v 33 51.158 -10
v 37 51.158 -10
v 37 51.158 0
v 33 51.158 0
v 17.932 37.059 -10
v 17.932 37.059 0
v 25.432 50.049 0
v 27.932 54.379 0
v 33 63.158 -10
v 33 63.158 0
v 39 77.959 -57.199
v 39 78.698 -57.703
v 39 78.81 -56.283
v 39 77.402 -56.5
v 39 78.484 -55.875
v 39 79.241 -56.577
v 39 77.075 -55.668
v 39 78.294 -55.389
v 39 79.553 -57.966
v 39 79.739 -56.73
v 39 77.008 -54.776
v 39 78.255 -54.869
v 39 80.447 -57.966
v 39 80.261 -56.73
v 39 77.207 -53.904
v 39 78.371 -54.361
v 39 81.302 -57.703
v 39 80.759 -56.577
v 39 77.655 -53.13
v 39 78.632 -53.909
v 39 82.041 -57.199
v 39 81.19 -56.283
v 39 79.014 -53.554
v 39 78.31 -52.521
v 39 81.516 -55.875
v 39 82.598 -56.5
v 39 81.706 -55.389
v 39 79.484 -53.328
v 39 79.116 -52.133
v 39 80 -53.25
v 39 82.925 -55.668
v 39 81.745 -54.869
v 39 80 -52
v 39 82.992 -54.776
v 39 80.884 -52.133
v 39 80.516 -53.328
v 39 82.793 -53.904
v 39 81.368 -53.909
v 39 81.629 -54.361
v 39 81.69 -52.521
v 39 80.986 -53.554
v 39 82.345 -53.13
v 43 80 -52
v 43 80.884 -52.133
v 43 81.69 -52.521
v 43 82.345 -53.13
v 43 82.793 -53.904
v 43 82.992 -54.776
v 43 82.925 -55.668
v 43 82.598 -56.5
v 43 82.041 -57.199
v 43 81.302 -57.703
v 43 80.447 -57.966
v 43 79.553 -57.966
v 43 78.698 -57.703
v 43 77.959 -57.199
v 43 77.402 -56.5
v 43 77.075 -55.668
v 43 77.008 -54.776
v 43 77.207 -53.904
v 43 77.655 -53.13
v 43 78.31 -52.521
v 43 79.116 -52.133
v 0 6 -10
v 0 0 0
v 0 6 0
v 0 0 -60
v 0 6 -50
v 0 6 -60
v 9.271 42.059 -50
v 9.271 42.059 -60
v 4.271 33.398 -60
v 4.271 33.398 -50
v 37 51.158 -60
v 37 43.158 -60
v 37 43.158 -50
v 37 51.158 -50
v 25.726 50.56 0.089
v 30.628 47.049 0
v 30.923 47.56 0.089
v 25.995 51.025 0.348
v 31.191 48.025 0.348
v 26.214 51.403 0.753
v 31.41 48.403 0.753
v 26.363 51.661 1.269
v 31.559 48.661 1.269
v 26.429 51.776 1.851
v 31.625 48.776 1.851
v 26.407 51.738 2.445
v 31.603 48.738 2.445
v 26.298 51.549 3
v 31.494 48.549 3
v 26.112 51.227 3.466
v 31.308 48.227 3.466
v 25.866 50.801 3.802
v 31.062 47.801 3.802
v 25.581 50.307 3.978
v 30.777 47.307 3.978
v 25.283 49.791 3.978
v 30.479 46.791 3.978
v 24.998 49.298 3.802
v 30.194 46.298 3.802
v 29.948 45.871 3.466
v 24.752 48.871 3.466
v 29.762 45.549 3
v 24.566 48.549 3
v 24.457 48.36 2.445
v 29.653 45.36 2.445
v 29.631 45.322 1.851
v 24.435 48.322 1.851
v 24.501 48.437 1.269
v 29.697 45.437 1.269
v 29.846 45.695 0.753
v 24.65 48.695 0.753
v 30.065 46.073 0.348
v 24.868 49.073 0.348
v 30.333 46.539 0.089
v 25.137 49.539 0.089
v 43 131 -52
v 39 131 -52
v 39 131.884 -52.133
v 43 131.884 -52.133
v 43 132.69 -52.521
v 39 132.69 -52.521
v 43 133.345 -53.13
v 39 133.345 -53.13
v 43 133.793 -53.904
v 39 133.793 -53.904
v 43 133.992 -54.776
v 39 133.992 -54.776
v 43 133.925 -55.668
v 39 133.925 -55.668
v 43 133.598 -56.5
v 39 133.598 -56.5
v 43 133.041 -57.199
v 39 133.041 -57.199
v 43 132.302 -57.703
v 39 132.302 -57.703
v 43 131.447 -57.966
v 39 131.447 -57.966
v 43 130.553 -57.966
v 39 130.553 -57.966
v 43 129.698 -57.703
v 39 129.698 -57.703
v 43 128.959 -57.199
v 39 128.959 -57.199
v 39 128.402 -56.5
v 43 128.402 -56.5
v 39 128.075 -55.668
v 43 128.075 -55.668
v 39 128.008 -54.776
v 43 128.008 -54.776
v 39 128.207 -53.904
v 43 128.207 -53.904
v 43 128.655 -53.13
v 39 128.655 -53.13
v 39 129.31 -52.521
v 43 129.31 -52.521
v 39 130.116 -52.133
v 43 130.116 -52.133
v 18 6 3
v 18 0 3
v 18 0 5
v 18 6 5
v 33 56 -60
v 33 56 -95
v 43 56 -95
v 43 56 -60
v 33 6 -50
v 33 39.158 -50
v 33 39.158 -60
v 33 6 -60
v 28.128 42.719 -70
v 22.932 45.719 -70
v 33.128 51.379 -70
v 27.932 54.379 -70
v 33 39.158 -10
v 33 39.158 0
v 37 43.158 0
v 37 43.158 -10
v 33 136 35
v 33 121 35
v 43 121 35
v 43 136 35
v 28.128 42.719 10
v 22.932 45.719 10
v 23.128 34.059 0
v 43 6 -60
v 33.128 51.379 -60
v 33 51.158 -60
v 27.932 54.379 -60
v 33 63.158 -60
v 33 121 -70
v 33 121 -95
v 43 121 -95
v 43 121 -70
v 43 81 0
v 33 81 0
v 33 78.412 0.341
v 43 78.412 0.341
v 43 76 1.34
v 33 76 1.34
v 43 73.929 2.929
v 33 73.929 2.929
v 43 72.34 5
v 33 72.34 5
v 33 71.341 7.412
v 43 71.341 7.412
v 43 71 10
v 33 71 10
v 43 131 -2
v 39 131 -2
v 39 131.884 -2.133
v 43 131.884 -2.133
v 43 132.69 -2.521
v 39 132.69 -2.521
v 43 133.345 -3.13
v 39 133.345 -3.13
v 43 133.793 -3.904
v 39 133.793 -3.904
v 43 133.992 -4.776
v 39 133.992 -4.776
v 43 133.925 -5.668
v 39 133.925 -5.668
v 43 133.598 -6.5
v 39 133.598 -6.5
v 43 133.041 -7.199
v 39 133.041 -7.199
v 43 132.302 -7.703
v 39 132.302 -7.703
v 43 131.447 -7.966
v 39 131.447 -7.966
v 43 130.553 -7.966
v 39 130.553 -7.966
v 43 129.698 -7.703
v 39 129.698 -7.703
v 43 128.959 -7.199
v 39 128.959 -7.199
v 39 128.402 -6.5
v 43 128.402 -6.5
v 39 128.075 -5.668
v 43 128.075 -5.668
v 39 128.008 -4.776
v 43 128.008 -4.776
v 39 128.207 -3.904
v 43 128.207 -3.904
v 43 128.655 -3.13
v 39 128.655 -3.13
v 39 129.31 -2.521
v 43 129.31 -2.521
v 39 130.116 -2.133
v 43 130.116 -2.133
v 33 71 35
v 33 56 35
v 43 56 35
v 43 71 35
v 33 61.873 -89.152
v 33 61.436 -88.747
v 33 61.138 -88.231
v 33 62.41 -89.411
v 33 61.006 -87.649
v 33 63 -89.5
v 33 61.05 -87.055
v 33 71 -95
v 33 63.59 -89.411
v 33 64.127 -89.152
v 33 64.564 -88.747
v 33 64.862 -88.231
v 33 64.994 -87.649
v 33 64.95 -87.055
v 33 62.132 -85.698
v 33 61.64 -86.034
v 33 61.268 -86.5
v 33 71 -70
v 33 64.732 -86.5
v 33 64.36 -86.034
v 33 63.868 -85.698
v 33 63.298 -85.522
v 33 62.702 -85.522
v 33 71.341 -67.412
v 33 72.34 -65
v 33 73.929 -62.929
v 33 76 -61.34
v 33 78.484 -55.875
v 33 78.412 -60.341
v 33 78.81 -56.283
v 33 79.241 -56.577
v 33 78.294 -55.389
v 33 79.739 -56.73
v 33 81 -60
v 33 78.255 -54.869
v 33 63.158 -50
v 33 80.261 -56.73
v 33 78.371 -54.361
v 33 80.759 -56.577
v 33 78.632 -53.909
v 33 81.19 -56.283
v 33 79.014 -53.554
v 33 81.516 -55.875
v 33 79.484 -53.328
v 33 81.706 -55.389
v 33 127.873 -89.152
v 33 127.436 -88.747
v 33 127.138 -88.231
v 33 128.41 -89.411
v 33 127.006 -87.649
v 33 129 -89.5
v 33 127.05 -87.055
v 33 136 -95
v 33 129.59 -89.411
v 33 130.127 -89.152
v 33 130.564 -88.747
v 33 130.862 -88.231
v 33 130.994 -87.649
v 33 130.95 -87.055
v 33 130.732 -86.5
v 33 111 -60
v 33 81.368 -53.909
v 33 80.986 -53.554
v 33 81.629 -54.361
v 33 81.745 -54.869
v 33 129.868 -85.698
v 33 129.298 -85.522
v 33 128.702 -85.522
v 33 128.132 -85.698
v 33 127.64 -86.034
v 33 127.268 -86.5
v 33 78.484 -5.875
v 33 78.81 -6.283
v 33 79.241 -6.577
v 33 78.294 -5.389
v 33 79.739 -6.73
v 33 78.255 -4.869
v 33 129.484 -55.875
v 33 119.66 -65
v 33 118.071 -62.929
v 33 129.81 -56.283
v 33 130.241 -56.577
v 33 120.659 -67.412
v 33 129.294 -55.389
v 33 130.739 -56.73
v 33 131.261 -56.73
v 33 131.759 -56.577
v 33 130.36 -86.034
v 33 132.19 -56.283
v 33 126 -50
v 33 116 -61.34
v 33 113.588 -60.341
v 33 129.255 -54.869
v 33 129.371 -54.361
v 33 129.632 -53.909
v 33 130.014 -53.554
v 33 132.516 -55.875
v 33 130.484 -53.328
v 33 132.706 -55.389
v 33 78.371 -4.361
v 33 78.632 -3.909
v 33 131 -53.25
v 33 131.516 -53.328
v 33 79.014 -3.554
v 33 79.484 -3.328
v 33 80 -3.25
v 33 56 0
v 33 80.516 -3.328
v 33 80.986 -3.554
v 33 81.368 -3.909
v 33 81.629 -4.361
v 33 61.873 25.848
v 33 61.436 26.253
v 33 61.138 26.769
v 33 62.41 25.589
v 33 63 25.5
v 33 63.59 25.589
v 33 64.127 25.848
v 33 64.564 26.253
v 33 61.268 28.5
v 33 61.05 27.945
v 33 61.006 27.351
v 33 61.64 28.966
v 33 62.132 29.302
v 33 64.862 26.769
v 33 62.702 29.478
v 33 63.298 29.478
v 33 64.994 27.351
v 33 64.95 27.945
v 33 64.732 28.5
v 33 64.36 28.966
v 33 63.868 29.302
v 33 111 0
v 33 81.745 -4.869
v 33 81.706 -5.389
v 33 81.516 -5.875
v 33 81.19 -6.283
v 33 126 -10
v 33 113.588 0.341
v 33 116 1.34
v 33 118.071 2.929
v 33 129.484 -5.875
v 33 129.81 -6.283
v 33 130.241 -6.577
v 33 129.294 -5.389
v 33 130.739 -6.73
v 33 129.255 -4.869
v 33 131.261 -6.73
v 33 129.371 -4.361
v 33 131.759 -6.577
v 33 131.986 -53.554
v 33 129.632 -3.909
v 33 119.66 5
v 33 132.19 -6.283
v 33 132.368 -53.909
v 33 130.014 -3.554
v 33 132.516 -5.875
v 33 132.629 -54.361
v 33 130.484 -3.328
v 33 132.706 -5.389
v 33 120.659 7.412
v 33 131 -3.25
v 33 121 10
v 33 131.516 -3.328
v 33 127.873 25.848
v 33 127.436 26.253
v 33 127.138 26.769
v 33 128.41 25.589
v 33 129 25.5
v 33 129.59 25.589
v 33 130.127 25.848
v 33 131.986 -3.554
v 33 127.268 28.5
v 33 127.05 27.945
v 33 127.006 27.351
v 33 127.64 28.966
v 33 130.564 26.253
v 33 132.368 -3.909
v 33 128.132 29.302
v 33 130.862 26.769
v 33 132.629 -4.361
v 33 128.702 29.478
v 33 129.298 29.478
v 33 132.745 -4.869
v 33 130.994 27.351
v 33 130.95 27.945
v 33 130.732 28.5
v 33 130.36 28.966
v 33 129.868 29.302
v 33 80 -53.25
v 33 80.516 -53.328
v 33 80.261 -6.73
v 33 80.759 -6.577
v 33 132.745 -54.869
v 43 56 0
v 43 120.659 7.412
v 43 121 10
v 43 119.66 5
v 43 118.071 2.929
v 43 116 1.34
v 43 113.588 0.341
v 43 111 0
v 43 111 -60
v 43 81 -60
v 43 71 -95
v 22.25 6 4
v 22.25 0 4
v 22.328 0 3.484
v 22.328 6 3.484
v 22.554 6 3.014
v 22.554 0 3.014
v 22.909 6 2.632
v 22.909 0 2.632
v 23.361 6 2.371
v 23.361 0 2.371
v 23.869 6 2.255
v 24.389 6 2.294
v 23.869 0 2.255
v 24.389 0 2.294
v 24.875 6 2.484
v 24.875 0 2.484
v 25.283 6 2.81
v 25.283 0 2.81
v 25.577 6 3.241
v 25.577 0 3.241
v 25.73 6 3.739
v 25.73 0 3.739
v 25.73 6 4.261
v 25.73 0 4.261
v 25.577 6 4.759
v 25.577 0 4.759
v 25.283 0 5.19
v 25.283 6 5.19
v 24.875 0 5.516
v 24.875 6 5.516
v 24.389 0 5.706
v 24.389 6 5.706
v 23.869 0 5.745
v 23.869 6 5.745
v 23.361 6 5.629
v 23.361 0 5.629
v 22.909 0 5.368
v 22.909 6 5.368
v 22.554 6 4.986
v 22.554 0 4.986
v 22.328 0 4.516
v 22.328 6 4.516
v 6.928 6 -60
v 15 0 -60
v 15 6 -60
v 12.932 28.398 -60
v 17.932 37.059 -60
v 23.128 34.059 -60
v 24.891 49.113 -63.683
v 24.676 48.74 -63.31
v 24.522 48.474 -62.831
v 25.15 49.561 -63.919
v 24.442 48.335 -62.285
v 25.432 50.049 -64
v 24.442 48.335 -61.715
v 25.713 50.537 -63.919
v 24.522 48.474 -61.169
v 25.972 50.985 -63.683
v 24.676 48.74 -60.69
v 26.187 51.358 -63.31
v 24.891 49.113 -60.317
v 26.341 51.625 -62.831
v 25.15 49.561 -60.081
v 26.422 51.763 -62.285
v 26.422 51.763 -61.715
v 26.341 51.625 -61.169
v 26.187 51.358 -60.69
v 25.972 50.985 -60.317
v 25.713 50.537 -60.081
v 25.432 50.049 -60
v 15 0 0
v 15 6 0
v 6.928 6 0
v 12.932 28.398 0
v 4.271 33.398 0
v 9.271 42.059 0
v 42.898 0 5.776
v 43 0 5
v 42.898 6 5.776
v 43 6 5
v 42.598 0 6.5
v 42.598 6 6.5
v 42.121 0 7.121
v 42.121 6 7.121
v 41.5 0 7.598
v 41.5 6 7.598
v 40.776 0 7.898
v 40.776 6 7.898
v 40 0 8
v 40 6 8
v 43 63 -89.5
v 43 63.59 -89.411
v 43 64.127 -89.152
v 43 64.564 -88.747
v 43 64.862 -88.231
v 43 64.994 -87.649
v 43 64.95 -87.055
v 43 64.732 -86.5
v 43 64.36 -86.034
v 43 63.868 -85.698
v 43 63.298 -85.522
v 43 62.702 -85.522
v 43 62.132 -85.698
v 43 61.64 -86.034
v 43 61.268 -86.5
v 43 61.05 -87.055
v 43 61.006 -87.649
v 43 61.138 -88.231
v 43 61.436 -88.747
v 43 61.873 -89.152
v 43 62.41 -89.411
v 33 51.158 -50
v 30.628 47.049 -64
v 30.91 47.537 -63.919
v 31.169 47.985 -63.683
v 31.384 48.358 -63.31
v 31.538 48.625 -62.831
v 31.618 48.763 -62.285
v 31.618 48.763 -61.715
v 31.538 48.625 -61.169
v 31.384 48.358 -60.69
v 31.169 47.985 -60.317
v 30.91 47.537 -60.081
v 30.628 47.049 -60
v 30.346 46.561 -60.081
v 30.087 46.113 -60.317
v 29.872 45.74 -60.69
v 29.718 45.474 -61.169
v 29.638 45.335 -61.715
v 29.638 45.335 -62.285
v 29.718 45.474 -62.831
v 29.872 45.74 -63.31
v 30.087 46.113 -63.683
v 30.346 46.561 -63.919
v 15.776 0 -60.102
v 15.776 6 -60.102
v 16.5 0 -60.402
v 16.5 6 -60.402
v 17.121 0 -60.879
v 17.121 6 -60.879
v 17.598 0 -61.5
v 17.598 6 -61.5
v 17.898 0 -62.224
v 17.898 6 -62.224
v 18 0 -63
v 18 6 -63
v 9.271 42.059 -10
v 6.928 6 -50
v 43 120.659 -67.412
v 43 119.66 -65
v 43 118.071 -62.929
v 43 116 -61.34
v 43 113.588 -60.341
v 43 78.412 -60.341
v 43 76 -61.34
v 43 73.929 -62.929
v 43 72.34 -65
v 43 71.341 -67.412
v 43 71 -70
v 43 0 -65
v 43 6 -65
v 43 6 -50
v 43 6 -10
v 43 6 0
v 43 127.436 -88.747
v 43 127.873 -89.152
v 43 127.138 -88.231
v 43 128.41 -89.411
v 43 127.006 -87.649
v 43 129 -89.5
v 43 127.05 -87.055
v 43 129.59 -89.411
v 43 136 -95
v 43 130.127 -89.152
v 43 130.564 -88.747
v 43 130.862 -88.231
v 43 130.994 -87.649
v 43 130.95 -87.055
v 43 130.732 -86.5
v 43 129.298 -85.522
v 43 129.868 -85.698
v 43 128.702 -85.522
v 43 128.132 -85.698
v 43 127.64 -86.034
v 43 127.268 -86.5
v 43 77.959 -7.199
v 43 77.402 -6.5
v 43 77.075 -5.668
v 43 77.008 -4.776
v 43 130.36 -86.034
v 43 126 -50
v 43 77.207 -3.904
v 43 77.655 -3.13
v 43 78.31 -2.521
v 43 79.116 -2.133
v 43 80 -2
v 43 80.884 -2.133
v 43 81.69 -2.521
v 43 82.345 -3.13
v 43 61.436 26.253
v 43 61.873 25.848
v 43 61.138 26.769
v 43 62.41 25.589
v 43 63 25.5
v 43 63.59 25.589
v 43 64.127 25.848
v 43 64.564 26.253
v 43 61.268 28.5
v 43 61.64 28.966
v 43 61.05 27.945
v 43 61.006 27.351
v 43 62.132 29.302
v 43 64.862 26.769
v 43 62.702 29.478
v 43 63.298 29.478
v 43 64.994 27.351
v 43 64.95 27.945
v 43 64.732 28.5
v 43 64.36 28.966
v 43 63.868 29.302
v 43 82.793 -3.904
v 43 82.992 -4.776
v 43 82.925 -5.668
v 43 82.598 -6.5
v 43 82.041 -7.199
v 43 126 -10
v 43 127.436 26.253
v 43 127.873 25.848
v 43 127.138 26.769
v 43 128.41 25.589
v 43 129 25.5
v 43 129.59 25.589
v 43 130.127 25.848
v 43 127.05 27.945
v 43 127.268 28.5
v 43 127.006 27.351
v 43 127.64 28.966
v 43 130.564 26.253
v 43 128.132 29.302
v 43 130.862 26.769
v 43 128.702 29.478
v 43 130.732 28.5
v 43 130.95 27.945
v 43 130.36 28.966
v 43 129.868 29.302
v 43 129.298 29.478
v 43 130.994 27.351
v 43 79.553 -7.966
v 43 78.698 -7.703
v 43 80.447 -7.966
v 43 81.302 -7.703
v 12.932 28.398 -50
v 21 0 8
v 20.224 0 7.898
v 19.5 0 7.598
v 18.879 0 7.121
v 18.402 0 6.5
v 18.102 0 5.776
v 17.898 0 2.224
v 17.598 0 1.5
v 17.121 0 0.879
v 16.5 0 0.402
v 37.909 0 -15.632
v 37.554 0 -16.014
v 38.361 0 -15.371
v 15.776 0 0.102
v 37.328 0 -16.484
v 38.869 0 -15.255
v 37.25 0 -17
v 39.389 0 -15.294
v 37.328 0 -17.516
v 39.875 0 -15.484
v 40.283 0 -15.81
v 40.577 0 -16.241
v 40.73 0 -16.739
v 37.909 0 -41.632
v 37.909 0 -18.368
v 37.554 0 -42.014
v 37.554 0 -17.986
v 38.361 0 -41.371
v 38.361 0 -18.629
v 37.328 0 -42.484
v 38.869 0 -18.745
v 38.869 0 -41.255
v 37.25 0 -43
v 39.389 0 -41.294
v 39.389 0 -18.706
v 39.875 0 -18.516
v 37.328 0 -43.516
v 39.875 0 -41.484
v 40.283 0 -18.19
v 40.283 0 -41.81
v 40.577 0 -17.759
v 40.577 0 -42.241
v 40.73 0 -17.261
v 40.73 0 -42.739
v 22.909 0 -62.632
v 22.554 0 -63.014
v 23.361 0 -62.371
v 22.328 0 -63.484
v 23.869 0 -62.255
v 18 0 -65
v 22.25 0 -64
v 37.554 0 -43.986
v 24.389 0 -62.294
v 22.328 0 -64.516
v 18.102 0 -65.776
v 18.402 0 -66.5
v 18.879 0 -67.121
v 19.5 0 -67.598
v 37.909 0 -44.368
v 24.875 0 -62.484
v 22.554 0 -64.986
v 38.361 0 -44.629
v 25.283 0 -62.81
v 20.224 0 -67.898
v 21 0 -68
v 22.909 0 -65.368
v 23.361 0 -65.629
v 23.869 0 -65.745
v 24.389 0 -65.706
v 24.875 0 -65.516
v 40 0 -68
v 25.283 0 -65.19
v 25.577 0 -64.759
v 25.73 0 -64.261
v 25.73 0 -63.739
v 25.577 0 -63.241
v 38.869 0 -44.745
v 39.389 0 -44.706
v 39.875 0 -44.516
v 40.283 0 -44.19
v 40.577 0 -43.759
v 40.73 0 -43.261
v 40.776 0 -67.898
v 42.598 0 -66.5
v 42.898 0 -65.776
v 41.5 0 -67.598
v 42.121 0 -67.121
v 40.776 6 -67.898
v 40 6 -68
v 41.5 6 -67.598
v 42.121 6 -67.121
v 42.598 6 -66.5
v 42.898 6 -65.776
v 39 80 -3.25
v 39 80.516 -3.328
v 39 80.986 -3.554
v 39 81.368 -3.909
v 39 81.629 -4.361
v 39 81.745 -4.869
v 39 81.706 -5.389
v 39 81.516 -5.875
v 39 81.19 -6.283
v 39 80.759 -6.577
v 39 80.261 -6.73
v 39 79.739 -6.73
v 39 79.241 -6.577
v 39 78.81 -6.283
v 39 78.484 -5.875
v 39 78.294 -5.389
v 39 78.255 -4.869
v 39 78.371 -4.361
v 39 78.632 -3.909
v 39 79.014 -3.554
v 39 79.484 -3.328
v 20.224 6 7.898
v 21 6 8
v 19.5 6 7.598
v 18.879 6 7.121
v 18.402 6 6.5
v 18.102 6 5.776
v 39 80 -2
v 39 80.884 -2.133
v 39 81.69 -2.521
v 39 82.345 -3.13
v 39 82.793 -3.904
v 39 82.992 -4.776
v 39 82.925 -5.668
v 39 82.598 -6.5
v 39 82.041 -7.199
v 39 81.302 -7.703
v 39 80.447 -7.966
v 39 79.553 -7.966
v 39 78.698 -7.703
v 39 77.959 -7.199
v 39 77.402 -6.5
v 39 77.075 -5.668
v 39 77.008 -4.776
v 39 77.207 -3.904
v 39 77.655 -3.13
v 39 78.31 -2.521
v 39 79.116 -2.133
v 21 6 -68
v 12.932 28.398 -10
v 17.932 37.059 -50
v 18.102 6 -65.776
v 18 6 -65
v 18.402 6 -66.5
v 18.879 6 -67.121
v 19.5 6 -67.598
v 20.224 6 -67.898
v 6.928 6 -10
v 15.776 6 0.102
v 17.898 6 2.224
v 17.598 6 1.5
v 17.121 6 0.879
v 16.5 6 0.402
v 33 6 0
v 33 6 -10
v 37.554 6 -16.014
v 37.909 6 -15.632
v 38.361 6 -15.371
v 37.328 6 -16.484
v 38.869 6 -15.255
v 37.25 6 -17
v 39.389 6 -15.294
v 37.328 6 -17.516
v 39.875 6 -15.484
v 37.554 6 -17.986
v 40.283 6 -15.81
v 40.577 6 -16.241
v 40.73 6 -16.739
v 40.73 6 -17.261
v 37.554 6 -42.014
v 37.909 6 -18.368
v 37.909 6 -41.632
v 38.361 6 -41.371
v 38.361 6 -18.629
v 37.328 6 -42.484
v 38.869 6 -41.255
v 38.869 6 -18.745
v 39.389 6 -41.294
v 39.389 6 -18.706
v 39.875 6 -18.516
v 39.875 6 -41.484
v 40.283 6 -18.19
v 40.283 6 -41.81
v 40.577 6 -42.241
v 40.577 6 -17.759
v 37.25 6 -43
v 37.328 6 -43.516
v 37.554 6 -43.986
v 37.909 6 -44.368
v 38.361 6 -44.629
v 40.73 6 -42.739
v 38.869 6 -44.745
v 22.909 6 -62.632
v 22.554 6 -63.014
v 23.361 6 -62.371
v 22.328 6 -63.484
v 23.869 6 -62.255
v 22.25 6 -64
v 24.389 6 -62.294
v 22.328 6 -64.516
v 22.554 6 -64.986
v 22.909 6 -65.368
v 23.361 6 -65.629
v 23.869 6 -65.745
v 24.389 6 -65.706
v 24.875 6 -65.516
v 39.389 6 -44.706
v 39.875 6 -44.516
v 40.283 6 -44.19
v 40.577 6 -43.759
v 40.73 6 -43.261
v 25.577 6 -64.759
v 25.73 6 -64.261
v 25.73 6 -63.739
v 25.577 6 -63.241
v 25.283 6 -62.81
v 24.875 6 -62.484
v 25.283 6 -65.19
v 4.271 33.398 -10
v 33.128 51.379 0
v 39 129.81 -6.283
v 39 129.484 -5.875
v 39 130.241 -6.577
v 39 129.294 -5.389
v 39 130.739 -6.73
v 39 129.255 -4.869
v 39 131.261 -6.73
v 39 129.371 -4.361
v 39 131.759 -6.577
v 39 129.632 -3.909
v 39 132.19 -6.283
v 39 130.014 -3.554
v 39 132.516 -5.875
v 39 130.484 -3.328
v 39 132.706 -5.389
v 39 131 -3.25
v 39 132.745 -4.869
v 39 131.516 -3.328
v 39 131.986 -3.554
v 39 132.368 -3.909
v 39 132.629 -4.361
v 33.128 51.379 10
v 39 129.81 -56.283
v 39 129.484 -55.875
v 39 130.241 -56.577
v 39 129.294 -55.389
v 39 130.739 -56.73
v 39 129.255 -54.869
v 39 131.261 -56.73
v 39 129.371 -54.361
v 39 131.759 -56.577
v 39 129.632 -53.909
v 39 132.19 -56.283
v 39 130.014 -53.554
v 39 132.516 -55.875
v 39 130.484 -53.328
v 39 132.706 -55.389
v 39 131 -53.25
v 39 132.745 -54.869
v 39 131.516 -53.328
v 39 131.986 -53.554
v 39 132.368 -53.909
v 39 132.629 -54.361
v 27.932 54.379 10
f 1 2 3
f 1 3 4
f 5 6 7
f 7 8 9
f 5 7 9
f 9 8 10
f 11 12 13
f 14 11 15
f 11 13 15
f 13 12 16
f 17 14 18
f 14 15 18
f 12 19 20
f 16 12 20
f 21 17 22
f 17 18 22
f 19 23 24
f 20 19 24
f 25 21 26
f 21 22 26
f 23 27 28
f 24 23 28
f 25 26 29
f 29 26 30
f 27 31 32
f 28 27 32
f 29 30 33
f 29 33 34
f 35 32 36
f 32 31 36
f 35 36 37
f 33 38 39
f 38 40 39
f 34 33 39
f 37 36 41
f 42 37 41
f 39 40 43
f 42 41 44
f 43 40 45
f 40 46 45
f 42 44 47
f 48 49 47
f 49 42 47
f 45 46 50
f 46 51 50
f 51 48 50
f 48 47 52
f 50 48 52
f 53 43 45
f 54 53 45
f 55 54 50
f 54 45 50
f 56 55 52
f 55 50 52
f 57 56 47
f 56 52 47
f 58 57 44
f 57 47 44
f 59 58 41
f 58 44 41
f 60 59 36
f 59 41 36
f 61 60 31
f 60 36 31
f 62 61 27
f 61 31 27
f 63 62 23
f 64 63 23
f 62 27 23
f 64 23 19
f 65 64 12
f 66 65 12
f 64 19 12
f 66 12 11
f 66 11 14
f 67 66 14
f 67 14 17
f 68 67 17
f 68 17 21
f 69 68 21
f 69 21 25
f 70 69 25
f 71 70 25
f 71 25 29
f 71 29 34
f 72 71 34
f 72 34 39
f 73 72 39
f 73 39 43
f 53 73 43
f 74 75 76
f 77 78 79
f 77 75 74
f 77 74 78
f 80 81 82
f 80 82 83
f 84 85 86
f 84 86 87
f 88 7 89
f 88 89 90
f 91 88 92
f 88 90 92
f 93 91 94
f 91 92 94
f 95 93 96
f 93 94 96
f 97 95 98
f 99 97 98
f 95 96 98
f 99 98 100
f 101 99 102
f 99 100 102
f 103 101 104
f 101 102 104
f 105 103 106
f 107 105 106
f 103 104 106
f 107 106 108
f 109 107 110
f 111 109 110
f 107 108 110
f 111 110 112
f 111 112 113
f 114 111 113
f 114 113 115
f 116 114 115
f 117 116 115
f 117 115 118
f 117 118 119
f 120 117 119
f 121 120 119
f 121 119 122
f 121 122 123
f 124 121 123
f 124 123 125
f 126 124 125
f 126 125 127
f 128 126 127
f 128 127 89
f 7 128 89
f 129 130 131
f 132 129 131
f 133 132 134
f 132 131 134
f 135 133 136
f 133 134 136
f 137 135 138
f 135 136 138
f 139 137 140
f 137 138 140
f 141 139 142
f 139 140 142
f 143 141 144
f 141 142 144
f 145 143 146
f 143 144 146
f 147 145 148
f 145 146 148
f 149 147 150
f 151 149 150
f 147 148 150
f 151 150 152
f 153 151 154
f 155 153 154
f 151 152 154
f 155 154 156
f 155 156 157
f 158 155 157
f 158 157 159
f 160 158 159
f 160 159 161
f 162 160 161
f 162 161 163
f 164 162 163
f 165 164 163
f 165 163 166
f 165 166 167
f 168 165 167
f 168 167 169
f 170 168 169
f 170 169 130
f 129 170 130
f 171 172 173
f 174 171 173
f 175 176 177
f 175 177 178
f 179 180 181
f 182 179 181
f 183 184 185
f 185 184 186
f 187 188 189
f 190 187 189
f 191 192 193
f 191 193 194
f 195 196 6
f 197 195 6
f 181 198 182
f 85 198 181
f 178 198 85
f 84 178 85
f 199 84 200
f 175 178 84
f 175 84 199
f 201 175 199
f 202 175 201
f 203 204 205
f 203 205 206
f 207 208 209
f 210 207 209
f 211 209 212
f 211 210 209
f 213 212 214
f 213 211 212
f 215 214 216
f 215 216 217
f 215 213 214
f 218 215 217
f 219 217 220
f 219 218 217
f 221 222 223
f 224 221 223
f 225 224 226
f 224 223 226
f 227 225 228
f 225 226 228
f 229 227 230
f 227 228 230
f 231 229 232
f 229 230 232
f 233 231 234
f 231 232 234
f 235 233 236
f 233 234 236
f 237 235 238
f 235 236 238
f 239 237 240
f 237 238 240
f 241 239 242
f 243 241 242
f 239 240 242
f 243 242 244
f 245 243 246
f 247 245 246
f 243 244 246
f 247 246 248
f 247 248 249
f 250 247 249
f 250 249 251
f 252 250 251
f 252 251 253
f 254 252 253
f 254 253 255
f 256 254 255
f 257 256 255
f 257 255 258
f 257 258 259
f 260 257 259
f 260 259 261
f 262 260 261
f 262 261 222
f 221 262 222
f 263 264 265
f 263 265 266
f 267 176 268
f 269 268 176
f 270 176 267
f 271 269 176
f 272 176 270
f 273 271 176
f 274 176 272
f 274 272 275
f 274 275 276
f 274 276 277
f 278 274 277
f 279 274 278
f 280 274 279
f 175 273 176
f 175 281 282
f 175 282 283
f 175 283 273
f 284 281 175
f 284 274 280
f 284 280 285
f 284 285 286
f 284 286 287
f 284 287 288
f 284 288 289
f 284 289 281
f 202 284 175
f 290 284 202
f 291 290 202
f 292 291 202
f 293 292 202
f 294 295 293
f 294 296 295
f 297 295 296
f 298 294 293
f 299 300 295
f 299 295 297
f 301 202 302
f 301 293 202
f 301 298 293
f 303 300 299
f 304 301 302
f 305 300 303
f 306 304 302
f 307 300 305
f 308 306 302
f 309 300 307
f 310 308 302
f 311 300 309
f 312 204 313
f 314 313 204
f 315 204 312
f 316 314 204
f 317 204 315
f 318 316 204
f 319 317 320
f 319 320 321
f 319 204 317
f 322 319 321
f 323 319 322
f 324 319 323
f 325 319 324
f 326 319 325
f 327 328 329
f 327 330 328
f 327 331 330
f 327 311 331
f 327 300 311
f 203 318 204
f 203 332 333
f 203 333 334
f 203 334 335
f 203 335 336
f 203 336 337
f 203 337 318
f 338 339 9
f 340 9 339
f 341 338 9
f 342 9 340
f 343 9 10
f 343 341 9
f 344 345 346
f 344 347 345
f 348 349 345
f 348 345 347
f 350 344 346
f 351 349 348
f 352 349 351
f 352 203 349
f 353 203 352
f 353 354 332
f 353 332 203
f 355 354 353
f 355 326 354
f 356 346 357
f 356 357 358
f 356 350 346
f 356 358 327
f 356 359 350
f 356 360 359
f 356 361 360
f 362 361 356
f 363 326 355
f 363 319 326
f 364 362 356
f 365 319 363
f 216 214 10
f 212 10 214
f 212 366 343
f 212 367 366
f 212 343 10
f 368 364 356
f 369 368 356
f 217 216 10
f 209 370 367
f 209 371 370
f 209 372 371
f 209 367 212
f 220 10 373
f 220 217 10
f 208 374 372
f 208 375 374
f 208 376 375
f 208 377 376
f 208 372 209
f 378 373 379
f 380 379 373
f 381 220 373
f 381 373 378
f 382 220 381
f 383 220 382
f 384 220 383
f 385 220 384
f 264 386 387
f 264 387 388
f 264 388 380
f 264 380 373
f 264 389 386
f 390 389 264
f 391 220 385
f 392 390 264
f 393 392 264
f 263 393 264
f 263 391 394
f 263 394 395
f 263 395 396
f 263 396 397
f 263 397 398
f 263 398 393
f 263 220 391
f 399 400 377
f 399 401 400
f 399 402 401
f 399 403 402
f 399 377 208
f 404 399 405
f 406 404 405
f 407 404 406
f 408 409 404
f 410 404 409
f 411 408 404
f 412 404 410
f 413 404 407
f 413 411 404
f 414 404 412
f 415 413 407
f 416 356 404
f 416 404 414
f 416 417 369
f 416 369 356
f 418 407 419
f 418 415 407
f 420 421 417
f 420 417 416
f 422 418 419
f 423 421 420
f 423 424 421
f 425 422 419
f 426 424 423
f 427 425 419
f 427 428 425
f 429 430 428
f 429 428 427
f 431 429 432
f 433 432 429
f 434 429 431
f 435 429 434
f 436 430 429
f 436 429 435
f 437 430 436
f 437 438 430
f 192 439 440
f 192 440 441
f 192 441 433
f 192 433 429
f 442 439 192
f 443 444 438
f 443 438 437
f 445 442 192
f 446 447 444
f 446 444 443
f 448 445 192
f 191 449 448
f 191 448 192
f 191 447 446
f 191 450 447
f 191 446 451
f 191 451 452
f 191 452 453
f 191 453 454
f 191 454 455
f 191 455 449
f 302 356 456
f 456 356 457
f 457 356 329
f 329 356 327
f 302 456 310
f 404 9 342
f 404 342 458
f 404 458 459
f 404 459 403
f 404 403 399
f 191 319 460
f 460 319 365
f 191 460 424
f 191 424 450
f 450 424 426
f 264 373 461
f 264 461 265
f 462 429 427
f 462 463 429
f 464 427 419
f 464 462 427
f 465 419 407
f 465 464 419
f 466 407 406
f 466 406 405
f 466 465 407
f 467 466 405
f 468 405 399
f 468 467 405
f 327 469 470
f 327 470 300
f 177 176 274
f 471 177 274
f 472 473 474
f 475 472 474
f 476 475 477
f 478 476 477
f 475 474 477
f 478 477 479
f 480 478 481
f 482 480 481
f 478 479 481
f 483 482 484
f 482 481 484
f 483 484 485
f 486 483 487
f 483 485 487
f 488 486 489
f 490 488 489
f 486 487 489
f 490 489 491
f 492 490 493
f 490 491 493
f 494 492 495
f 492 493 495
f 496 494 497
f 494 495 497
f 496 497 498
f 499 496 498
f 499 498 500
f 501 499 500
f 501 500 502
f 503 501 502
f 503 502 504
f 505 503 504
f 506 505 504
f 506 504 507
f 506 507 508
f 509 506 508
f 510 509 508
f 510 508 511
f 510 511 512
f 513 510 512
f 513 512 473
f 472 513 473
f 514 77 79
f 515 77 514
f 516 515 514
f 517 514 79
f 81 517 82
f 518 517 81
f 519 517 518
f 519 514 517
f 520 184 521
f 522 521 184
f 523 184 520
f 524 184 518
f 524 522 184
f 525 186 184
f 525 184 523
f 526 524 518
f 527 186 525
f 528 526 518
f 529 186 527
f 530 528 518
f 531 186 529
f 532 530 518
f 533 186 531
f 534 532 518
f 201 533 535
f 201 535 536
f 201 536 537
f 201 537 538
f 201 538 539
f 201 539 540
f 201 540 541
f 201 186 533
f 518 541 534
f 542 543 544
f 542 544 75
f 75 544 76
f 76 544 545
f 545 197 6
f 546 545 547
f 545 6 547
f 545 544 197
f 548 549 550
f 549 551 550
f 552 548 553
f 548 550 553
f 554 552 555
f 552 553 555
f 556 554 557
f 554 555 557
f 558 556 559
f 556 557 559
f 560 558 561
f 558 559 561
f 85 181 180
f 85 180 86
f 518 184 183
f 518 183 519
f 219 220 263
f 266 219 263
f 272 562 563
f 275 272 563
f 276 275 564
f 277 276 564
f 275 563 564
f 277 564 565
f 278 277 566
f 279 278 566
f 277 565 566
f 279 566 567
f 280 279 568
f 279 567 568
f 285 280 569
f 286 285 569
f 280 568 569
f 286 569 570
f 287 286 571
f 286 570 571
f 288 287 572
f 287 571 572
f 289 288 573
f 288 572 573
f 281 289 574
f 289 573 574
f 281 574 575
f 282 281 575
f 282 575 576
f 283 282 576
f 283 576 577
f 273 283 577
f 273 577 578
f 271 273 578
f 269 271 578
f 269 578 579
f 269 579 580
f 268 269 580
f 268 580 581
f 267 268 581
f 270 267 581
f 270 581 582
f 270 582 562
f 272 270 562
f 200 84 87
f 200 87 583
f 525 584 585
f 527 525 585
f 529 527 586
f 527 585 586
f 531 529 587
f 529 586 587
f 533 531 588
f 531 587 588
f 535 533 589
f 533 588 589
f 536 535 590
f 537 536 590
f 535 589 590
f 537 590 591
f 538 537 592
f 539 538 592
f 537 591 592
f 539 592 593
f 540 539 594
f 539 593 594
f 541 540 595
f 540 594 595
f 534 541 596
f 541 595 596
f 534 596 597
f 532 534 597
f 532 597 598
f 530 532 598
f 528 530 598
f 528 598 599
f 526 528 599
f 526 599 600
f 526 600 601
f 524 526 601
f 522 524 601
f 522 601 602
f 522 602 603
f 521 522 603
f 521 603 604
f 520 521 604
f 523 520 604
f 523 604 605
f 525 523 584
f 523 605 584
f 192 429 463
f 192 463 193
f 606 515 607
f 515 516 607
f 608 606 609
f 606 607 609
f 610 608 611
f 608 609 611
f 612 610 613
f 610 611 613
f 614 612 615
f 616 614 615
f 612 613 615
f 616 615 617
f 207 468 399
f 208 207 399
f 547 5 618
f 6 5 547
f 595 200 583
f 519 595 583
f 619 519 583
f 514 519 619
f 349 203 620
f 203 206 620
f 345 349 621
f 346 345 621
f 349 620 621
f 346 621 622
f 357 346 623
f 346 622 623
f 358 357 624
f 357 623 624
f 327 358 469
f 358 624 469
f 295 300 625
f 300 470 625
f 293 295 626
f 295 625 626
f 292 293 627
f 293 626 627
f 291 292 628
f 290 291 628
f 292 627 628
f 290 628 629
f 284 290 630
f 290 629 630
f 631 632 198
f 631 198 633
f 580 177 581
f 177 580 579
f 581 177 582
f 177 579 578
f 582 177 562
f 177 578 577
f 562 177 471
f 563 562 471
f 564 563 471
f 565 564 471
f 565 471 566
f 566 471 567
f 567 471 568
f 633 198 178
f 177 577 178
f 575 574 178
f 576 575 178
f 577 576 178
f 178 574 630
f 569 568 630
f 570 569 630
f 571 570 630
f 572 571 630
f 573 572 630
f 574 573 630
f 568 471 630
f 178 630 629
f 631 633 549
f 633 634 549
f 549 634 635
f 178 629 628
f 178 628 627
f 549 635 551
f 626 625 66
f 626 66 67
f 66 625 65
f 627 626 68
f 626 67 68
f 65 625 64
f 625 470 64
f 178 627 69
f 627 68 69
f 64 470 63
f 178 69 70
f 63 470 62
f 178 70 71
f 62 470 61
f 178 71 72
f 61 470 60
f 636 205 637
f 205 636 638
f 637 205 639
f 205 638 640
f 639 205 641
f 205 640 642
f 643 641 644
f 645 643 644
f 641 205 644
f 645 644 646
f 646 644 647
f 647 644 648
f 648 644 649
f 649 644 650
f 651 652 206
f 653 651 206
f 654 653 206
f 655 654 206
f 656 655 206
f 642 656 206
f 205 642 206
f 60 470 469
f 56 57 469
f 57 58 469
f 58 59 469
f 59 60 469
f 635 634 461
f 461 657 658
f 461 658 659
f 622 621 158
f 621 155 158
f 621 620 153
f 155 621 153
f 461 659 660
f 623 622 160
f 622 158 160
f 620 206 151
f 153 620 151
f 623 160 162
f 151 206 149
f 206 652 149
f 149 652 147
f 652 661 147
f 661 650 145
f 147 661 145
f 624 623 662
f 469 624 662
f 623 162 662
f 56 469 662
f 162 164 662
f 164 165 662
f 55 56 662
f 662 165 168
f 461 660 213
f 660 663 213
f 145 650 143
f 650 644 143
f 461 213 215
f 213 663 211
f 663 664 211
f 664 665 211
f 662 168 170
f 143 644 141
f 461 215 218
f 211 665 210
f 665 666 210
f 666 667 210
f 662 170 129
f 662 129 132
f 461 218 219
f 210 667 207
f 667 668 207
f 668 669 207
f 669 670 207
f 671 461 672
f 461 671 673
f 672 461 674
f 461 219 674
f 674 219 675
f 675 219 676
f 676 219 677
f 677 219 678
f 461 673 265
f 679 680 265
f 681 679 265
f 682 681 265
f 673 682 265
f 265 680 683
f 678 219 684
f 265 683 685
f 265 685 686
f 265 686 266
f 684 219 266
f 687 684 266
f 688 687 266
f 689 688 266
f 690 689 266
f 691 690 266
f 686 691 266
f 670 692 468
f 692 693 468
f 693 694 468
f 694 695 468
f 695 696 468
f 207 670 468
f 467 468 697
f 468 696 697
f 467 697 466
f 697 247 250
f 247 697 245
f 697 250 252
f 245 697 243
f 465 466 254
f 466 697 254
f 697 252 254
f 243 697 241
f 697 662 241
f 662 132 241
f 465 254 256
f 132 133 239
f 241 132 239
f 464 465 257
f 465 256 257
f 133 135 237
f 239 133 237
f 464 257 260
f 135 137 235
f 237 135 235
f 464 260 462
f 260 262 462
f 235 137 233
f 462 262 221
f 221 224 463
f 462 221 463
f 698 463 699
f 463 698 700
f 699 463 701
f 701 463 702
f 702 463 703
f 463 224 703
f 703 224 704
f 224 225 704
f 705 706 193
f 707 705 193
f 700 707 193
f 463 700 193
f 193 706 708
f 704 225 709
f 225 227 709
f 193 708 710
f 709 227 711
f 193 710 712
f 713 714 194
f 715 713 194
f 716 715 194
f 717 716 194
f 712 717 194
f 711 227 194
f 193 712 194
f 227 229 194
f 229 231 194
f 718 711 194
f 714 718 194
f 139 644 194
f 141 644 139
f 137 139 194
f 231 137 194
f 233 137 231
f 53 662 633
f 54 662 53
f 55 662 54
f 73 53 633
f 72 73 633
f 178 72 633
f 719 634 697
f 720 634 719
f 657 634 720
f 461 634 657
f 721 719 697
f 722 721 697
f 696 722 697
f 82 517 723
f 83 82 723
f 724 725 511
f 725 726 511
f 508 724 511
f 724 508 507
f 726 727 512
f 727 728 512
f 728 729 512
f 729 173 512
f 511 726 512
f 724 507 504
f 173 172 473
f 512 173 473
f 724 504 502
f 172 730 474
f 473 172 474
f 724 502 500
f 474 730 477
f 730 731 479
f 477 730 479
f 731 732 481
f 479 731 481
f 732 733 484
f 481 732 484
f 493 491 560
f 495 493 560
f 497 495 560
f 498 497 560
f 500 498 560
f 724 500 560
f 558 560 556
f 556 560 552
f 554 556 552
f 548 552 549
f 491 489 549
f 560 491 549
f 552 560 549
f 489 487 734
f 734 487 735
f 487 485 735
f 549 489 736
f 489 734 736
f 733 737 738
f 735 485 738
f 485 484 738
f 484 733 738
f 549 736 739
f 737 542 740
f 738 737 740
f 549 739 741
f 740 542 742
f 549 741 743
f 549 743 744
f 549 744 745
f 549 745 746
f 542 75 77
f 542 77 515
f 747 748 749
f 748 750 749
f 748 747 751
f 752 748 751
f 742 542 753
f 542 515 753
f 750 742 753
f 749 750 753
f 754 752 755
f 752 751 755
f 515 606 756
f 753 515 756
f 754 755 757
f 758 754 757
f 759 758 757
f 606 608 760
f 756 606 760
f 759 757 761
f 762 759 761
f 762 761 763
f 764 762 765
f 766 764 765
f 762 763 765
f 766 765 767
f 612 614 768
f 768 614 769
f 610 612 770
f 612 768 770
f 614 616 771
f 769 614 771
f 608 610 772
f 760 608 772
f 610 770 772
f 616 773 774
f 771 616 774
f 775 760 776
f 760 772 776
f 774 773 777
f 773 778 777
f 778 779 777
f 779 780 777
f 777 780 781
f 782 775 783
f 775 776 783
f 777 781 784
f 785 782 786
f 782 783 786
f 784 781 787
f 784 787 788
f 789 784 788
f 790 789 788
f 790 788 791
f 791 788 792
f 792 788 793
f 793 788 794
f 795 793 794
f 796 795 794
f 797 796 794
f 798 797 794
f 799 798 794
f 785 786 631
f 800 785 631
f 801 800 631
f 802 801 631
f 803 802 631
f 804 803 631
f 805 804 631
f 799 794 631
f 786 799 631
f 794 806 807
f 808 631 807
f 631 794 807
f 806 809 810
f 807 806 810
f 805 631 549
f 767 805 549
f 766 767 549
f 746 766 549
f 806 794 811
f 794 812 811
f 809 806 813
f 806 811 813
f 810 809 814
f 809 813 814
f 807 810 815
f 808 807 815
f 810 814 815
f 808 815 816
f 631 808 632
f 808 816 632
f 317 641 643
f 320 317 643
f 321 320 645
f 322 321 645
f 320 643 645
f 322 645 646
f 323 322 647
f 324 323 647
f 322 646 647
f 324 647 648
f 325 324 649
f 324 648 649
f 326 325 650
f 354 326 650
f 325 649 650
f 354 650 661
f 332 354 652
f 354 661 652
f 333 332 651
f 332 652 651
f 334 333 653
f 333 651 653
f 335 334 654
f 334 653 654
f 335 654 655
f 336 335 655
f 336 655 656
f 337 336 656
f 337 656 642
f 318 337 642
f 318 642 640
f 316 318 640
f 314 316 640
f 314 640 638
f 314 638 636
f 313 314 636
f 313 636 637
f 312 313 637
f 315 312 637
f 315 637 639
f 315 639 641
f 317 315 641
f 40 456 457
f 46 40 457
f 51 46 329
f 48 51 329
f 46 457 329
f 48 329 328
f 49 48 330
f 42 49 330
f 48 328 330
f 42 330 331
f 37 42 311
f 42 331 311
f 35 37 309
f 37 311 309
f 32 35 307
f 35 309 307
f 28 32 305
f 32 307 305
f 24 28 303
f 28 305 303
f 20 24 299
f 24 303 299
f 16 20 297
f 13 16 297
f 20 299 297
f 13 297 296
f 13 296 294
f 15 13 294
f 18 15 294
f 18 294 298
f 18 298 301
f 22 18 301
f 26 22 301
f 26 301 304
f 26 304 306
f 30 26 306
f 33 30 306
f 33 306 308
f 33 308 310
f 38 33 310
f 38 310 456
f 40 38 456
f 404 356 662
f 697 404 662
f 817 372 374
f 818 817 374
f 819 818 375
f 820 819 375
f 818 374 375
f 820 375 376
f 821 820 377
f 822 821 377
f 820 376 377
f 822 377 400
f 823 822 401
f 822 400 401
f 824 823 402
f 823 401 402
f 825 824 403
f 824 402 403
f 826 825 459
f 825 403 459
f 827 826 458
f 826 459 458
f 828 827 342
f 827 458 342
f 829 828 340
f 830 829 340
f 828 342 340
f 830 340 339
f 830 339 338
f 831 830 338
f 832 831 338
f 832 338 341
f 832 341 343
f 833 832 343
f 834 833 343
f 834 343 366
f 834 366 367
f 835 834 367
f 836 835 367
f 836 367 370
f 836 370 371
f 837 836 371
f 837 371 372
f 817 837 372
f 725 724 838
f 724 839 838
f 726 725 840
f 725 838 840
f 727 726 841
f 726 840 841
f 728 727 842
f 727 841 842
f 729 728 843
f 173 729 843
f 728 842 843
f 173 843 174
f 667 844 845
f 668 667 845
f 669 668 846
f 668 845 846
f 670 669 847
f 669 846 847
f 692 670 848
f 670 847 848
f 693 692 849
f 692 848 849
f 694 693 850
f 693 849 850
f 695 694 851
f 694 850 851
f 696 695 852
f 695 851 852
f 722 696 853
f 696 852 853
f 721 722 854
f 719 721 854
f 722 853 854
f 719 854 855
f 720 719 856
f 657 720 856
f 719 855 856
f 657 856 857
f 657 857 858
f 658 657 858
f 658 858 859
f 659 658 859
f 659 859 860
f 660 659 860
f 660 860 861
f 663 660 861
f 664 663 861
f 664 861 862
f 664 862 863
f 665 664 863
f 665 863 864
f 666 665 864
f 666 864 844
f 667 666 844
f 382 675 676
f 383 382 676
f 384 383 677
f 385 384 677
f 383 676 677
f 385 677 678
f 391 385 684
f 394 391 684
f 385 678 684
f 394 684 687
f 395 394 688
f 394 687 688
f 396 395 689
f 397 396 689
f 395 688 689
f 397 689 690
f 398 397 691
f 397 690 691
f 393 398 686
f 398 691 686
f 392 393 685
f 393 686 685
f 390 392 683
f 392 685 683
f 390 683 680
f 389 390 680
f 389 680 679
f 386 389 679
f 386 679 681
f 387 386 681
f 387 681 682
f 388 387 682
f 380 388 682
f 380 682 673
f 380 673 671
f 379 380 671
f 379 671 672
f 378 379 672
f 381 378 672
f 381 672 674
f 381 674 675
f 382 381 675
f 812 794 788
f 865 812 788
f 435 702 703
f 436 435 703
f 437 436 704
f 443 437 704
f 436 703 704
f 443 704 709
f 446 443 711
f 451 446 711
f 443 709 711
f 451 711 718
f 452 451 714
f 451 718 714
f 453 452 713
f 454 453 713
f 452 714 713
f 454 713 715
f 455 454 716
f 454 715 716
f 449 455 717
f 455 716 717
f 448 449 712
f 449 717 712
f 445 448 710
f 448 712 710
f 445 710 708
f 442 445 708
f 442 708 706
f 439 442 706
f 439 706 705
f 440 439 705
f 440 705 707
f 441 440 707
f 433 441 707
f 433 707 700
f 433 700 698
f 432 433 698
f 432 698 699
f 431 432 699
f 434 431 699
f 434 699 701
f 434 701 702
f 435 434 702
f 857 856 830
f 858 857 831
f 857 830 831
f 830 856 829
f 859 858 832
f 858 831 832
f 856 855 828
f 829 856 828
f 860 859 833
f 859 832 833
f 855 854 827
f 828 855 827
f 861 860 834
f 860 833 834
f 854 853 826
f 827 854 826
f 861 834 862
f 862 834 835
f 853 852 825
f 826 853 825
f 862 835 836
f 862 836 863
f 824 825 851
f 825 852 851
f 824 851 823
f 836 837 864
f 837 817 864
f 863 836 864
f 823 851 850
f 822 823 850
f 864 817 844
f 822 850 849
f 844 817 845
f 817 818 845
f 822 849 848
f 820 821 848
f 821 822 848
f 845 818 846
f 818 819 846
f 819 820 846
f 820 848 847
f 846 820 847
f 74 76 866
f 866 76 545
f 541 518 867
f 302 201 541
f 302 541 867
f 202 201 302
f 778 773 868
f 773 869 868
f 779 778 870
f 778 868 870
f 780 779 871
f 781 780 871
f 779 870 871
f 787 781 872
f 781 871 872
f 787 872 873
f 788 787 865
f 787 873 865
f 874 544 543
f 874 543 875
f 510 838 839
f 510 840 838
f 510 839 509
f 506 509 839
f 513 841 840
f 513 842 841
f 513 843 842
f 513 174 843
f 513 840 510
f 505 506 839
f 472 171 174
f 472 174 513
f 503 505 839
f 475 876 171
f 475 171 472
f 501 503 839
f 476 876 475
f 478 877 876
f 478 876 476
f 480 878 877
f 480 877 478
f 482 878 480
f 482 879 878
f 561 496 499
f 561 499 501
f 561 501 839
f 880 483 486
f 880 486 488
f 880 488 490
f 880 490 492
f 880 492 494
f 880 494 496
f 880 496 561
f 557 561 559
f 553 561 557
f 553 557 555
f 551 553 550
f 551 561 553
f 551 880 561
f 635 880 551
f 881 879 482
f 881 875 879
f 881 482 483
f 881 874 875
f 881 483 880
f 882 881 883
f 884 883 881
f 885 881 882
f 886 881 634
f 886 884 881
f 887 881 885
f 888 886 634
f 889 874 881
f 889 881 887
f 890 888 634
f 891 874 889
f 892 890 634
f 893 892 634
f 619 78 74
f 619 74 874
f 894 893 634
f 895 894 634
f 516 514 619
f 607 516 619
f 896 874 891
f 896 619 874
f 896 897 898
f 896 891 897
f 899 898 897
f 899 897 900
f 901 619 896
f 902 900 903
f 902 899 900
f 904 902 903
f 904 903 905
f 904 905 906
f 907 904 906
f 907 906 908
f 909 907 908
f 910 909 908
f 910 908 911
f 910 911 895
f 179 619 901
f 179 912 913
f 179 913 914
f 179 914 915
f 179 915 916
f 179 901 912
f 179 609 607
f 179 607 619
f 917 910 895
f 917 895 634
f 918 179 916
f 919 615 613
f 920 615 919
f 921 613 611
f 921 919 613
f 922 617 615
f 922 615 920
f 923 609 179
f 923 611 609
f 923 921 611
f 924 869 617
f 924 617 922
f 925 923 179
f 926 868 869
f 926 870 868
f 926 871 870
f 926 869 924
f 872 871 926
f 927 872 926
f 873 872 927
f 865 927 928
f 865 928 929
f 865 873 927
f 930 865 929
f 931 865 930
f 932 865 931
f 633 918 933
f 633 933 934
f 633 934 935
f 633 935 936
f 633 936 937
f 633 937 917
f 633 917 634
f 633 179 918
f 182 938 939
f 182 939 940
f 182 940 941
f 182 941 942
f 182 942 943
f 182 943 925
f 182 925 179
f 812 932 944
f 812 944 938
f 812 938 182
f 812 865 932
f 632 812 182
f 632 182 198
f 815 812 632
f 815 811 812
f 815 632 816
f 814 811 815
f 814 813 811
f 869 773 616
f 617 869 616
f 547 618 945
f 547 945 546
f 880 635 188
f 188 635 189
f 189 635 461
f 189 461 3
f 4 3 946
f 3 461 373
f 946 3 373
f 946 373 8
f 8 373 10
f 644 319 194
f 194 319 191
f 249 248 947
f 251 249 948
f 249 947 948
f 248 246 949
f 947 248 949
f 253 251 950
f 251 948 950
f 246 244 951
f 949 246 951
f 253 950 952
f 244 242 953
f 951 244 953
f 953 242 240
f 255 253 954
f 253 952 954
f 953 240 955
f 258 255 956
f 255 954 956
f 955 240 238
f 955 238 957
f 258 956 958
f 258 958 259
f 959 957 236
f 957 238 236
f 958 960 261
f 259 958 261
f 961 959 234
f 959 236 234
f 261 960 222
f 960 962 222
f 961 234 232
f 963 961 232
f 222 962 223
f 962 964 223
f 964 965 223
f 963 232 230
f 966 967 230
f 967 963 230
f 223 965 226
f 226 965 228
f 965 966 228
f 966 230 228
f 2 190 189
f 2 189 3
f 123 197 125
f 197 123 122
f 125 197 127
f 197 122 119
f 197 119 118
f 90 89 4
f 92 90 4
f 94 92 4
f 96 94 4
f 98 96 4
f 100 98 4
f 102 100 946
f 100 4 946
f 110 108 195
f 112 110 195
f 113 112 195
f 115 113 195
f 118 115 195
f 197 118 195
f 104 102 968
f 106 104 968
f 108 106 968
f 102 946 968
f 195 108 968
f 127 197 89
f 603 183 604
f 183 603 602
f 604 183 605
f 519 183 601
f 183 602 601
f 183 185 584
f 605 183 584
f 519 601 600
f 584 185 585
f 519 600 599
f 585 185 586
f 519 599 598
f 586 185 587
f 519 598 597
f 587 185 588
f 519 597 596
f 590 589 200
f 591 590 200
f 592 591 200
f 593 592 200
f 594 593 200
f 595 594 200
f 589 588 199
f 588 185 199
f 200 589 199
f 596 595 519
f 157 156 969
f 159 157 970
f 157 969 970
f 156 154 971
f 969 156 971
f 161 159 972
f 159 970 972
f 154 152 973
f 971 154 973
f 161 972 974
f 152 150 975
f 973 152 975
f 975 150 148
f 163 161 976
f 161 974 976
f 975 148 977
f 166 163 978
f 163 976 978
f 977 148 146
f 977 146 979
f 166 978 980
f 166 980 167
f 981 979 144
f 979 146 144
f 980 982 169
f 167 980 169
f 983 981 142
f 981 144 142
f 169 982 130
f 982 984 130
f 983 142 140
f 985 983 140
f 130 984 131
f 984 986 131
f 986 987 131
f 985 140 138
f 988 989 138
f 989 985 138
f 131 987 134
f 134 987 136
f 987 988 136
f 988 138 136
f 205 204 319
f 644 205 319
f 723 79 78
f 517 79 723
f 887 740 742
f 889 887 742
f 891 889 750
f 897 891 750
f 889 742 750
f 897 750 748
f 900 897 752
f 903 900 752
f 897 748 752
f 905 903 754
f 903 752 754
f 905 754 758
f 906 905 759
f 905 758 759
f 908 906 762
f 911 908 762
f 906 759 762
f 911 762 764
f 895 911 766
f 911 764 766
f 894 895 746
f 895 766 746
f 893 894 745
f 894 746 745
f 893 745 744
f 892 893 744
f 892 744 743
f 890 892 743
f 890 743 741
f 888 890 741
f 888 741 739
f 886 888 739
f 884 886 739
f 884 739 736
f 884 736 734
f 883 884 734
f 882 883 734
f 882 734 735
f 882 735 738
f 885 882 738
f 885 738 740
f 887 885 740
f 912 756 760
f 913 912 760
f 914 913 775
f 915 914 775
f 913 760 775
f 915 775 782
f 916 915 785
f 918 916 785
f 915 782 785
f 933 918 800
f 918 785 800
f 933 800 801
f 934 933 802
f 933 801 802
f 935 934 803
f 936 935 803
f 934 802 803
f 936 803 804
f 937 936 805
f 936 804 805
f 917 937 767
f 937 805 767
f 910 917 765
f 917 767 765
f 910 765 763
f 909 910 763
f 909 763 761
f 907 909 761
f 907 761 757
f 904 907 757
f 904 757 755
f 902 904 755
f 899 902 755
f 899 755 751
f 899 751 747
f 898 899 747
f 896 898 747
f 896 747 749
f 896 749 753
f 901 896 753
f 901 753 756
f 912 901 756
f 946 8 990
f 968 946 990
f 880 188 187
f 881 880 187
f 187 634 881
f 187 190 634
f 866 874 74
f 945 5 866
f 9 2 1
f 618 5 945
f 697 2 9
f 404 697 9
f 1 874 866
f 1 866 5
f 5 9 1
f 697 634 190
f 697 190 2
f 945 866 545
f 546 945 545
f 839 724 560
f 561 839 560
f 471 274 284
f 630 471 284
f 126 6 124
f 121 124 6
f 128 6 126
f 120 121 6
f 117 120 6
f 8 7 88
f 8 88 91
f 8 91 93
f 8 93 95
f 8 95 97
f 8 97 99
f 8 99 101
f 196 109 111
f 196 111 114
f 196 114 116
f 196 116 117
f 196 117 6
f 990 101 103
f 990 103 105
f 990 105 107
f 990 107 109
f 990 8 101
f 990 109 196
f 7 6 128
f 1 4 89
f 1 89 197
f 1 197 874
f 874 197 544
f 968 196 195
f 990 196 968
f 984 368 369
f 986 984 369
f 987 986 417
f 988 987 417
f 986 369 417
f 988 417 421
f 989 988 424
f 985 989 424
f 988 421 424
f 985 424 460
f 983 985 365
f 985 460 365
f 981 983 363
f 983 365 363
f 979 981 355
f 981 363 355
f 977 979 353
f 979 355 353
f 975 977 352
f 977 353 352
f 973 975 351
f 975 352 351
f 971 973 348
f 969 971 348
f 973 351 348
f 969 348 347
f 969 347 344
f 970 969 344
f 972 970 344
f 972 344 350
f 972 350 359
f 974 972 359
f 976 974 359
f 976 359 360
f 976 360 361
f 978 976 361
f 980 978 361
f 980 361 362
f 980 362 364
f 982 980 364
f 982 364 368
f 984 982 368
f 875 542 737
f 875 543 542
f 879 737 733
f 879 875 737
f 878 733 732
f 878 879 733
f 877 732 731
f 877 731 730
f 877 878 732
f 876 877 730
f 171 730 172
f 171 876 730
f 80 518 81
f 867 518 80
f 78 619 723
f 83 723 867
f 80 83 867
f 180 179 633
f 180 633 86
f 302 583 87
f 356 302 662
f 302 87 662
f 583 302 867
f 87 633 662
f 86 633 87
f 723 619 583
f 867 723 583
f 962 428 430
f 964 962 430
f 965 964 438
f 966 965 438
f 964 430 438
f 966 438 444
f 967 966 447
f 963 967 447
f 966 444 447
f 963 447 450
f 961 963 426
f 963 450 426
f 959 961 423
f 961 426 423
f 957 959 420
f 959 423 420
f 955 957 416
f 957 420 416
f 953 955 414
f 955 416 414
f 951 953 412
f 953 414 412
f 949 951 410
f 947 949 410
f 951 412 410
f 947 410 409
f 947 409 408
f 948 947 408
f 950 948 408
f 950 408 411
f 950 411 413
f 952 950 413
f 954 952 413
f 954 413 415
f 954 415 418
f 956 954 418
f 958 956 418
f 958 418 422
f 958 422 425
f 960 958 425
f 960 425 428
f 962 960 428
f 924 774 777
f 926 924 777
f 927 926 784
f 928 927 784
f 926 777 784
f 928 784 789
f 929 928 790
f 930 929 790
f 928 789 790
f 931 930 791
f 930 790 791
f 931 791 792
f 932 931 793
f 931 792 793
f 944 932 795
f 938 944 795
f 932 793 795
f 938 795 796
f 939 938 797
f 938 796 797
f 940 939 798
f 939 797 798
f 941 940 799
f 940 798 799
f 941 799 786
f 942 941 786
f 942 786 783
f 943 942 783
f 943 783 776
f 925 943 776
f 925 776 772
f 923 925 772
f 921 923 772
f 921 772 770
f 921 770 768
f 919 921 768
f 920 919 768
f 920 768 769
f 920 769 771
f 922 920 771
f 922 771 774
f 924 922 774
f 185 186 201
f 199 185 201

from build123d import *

# Parameters (mm, degrees)
SKETCH_1_W          = 35
SKETCH_1_H          = 60
SKETCH_1_W_2        = 8
EXTRUDE_1_DEPTH     = 6
HOLE_WIZARD_1_D     = 3.5
FILLET_1_R          = 3
SKETCH_5_W          = 10
SKETCH_5_H          = 10
EXTRUDE_2_DEPTH     = 120
SKETCH_10_W         = 10
SKETCH_10_H         = 60
EXTRUDE_5_DEPTH     = 10
HOLE_WIZARD_2_D     = 3.5
HOLE_WIZARD_3_D     = 6
HOLE_WIZARD_3_DEPTH = 4
EXTRUDE_6_DEPTH     = 10
SKETCH_18_W         = 35
SKETCH_18_H         = 15
EXTRUDE_7_DEPTH     = 10
HOLE_WIZARD_4_D     = 4
FILLET_2_R          = 10
FILLET_3_R          = 3
SKETCH_21_W         = 10
SKETCH_21_H         = 10
EXTRUDE_8_DEPTH     = 6
HOLE_WIZARD_5_D     = 4
SKETCH_25_W         = 10
SKETCH_25_H         = 10
EXTRUDE_9_DEPTH     = 10
SKETCH_28_W         = 4
SKETCH_28_H         = 8
CUT_EXTRUDE_1_DEPTH = 172.37677789
CUT_EXTRUDE_2_DEPTH = 172.37677789


with BuildPart() as part:
    # 草图1 → 凸台-拉伸1 (new body)
    with BuildSketch(Plane(origin=(0, 0, 0), x_dir=(1, 0, 0), z_dir=(0, 1, 0))):
        Polygon((18, 68), (18, 60), (35, 60), (43, 60), (43, 68), align=None)
        with Locations((17.5, 30)):
            Rectangle(SKETCH_1_W, SKETCH_1_H)
        with Locations((39, 30)):
            Rectangle(SKETCH_1_W_2, SKETCH_1_H)
        Polygon((35, 0), (18, 0), (18, -8), (43, -8), (43, 0), align=None)
    extrude(amount=EXTRUDE_1_DEPTH)

    # 孔1 (through all)
    with Locations(Plane(origin=(0, 6, 0), x_dir=(1, 0, 0), z_dir=(0, 1, 0))):
        with Locations((24, 64), (39, 43), (39, 17), (24, -4)):
            Hole(HOLE_WIZARD_1_D / 2)

    # 圆角1
    fillet_1_edges = [part.edges().sort_by_distance(p)[0] for p in [
        (18, 3, 8),
        (18, 3, 0),
        (18, 3, -68),
        (43, 3, -68),
        (43, 3, 8),
    ]]
    fillet(fillet_1_edges, radius=FILLET_1_R)

    # 草图5 → 凸台-拉伸2 (add)
    with BuildSketch(Plane(origin=(0, 6, 0), x_dir=(1, 0, 0), z_dir=(0, 1, 0))):
        with Locations((38, 55)):
            Rectangle(SKETCH_5_W, SKETCH_5_H)
        with Locations((38, 5)):
            Rectangle(SKETCH_5_W, SKETCH_5_H)
    extrude(amount=EXTRUDE_2_DEPTH)

    # 草图10 → 凸台-拉伸5 (add)
    with BuildSketch(Plane(origin=(0, 126, 0), x_dir=(1, 0, 0), z_dir=(0, 1, 0))):
        with Locations((38, 30)):
            Rectangle(SKETCH_10_W, SKETCH_10_H)
    extrude(amount=EXTRUDE_5_DEPTH)

    # 孔2 (through all)
    with Locations(Plane(origin=(43, 0, 0), x_dir=(0, 0, -1), z_dir=(1, 0, 0))):
        with Locations((5, 131), (55, 131), (55, 80), (5, 80)):
            Hole(HOLE_WIZARD_2_D / 2)

    # 孔3
    with Locations(Plane(origin=(43, 0, 0), x_dir=(0, 0, -1), z_dir=(1, 0, 0))):
        with Locations((5, 131), (5, 80), (55, 80), (55, 131)):
            Hole(HOLE_WIZARD_3_D / 2, depth=HOLE_WIZARD_3_DEPTH)

    # 草图16 → 凸台-拉伸6 (add)
    with BuildSketch(Plane(origin=(0, 0, -60), x_dir=(-1, 0, 0), z_dir=(0, 0, -1))):
        Polygon((-33, 51.15767665), (-6.92820323, 6), (0, 6), (-33, 63.15767665), align=None)
    extrude_6 = extrude(amount=-EXTRUDE_6_DEPTH)

    # 镜向1: 凸台-拉伸6 across plane
    add(extrude_6.mirror(Plane.XY.offset(-30)))

    # 草图18 → 凸台-拉伸7 (add)
    with BuildSketch(Plane.ZY.offset(-33)):
        with Locations((-77.5, 128.5)):
            Rectangle(SKETCH_18_W, SKETCH_18_H)
        with Locations((17.5, 128.5)):
            Rectangle(SKETCH_18_W, SKETCH_18_H)
        with Locations((-77.5, 63.5)):
            Rectangle(SKETCH_18_W, SKETCH_18_H)
        with Locations((17.5, 63.5)):
            Rectangle(SKETCH_18_W, SKETCH_18_H)
    extrude(amount=-EXTRUDE_7_DEPTH)

    # 孔4 (through all)
    with Locations(Plane.ZY.offset(-33)):
        with Locations((-87.5, 129), (27.5, 129), (27.5, 63), (-87.5, 63)):
            Hole(HOLE_WIZARD_4_D / 2)

    # 圆角2
    fillet_2_edges = [part.edges().sort_by_distance(p)[0] for p in [
        (38, 121, -60),
        (38, 121, 0),
        (38, 71, -60),
        (38, 71, 0),
    ]]
    fillet(fillet_2_edges, radius=FILLET_2_R)

    # 圆角3
    fillet_3_edges = [part.edges().sort_by_distance(p)[0] for p in [
        (18, 3, -60),
    ]]
    fillet(fillet_3_edges, radius=FILLET_3_R)

    # 草图21 → 凸台-拉伸8 (add)
    with BuildSketch(Plane(origin=(-2.598076211, 1.5, 0), x_dir=(0, 0, 1), z_dir=(-0.8660254037844363, 0.5000000000000042, 0))):
        Polygon((-60, 51.059600438), (-70, 51.059600438), (-60, 41.059600438), align=None)
        with Locations((-65, 56.059600438)):
            Rectangle(SKETCH_21_W, SKETCH_21_H)
        with Locations((5, 56.059600438)):
            Rectangle(SKETCH_21_W, SKETCH_21_H)
        Polygon((0, 51.059600438), (10, 51.059600438), (0, 41.059600438), align=None)
    extrude(amount=-EXTRUDE_8_DEPTH)

    # 孔5 (through all)
    with Locations(Plane(origin=(-2.598076211, 1.5, 0), x_dir=(0, 0, 1), z_dir=(-0.8660254037844363, 0.5000000000000042, 0))):
        with Locations((-62, 56.059600438), (2, 56.059600438)):
            Hole(HOLE_WIZARD_5_D / 2)

    # 草图25 → 凸台-拉伸9 (add)
    with BuildSketch(Plane(origin=(-2.598076211, 1.5, 0), x_dir=(0, 0, 1), z_dir=(-0.8660254037844363, 0.5000000000000042, 0))):
        with Locations((-55, 36.059600438)):
            Rectangle(SKETCH_25_W, SKETCH_25_H)
        with Locations((-5, 36.059600438)):
            Rectangle(SKETCH_25_W, SKETCH_25_H)
    extrude(amount=EXTRUDE_9_DEPTH)

    # 草图28 → 切除-拉伸1 (cut, through all)
    with BuildSketch(Plane(origin=(0, 0, -60), x_dir=(-1, 0, 0), z_dir=(0, 0, -1))):
        with Locations((-35, 47.15767665)):
            Rectangle(SKETCH_28_W, SKETCH_28_H)
    extrude(amount=-CUT_EXTRUDE_1_DEPTH, mode=Mode.SUBTRACT)

    # 草图29 → 切除-拉伸2 (cut, through all)
    with BuildSketch(Plane(origin=(0, 0, -60), x_dir=(-1, 0, 0), z_dir=(0, 0, -1))):
        Polygon((-37, 43.15767665), (-33, 43.15767665), (-33, 39.15767665), align=None)
    extrude(amount=-CUT_EXTRUDE_2_DEPTH, mode=Mode.SUBTRACT)


solid = part.part
